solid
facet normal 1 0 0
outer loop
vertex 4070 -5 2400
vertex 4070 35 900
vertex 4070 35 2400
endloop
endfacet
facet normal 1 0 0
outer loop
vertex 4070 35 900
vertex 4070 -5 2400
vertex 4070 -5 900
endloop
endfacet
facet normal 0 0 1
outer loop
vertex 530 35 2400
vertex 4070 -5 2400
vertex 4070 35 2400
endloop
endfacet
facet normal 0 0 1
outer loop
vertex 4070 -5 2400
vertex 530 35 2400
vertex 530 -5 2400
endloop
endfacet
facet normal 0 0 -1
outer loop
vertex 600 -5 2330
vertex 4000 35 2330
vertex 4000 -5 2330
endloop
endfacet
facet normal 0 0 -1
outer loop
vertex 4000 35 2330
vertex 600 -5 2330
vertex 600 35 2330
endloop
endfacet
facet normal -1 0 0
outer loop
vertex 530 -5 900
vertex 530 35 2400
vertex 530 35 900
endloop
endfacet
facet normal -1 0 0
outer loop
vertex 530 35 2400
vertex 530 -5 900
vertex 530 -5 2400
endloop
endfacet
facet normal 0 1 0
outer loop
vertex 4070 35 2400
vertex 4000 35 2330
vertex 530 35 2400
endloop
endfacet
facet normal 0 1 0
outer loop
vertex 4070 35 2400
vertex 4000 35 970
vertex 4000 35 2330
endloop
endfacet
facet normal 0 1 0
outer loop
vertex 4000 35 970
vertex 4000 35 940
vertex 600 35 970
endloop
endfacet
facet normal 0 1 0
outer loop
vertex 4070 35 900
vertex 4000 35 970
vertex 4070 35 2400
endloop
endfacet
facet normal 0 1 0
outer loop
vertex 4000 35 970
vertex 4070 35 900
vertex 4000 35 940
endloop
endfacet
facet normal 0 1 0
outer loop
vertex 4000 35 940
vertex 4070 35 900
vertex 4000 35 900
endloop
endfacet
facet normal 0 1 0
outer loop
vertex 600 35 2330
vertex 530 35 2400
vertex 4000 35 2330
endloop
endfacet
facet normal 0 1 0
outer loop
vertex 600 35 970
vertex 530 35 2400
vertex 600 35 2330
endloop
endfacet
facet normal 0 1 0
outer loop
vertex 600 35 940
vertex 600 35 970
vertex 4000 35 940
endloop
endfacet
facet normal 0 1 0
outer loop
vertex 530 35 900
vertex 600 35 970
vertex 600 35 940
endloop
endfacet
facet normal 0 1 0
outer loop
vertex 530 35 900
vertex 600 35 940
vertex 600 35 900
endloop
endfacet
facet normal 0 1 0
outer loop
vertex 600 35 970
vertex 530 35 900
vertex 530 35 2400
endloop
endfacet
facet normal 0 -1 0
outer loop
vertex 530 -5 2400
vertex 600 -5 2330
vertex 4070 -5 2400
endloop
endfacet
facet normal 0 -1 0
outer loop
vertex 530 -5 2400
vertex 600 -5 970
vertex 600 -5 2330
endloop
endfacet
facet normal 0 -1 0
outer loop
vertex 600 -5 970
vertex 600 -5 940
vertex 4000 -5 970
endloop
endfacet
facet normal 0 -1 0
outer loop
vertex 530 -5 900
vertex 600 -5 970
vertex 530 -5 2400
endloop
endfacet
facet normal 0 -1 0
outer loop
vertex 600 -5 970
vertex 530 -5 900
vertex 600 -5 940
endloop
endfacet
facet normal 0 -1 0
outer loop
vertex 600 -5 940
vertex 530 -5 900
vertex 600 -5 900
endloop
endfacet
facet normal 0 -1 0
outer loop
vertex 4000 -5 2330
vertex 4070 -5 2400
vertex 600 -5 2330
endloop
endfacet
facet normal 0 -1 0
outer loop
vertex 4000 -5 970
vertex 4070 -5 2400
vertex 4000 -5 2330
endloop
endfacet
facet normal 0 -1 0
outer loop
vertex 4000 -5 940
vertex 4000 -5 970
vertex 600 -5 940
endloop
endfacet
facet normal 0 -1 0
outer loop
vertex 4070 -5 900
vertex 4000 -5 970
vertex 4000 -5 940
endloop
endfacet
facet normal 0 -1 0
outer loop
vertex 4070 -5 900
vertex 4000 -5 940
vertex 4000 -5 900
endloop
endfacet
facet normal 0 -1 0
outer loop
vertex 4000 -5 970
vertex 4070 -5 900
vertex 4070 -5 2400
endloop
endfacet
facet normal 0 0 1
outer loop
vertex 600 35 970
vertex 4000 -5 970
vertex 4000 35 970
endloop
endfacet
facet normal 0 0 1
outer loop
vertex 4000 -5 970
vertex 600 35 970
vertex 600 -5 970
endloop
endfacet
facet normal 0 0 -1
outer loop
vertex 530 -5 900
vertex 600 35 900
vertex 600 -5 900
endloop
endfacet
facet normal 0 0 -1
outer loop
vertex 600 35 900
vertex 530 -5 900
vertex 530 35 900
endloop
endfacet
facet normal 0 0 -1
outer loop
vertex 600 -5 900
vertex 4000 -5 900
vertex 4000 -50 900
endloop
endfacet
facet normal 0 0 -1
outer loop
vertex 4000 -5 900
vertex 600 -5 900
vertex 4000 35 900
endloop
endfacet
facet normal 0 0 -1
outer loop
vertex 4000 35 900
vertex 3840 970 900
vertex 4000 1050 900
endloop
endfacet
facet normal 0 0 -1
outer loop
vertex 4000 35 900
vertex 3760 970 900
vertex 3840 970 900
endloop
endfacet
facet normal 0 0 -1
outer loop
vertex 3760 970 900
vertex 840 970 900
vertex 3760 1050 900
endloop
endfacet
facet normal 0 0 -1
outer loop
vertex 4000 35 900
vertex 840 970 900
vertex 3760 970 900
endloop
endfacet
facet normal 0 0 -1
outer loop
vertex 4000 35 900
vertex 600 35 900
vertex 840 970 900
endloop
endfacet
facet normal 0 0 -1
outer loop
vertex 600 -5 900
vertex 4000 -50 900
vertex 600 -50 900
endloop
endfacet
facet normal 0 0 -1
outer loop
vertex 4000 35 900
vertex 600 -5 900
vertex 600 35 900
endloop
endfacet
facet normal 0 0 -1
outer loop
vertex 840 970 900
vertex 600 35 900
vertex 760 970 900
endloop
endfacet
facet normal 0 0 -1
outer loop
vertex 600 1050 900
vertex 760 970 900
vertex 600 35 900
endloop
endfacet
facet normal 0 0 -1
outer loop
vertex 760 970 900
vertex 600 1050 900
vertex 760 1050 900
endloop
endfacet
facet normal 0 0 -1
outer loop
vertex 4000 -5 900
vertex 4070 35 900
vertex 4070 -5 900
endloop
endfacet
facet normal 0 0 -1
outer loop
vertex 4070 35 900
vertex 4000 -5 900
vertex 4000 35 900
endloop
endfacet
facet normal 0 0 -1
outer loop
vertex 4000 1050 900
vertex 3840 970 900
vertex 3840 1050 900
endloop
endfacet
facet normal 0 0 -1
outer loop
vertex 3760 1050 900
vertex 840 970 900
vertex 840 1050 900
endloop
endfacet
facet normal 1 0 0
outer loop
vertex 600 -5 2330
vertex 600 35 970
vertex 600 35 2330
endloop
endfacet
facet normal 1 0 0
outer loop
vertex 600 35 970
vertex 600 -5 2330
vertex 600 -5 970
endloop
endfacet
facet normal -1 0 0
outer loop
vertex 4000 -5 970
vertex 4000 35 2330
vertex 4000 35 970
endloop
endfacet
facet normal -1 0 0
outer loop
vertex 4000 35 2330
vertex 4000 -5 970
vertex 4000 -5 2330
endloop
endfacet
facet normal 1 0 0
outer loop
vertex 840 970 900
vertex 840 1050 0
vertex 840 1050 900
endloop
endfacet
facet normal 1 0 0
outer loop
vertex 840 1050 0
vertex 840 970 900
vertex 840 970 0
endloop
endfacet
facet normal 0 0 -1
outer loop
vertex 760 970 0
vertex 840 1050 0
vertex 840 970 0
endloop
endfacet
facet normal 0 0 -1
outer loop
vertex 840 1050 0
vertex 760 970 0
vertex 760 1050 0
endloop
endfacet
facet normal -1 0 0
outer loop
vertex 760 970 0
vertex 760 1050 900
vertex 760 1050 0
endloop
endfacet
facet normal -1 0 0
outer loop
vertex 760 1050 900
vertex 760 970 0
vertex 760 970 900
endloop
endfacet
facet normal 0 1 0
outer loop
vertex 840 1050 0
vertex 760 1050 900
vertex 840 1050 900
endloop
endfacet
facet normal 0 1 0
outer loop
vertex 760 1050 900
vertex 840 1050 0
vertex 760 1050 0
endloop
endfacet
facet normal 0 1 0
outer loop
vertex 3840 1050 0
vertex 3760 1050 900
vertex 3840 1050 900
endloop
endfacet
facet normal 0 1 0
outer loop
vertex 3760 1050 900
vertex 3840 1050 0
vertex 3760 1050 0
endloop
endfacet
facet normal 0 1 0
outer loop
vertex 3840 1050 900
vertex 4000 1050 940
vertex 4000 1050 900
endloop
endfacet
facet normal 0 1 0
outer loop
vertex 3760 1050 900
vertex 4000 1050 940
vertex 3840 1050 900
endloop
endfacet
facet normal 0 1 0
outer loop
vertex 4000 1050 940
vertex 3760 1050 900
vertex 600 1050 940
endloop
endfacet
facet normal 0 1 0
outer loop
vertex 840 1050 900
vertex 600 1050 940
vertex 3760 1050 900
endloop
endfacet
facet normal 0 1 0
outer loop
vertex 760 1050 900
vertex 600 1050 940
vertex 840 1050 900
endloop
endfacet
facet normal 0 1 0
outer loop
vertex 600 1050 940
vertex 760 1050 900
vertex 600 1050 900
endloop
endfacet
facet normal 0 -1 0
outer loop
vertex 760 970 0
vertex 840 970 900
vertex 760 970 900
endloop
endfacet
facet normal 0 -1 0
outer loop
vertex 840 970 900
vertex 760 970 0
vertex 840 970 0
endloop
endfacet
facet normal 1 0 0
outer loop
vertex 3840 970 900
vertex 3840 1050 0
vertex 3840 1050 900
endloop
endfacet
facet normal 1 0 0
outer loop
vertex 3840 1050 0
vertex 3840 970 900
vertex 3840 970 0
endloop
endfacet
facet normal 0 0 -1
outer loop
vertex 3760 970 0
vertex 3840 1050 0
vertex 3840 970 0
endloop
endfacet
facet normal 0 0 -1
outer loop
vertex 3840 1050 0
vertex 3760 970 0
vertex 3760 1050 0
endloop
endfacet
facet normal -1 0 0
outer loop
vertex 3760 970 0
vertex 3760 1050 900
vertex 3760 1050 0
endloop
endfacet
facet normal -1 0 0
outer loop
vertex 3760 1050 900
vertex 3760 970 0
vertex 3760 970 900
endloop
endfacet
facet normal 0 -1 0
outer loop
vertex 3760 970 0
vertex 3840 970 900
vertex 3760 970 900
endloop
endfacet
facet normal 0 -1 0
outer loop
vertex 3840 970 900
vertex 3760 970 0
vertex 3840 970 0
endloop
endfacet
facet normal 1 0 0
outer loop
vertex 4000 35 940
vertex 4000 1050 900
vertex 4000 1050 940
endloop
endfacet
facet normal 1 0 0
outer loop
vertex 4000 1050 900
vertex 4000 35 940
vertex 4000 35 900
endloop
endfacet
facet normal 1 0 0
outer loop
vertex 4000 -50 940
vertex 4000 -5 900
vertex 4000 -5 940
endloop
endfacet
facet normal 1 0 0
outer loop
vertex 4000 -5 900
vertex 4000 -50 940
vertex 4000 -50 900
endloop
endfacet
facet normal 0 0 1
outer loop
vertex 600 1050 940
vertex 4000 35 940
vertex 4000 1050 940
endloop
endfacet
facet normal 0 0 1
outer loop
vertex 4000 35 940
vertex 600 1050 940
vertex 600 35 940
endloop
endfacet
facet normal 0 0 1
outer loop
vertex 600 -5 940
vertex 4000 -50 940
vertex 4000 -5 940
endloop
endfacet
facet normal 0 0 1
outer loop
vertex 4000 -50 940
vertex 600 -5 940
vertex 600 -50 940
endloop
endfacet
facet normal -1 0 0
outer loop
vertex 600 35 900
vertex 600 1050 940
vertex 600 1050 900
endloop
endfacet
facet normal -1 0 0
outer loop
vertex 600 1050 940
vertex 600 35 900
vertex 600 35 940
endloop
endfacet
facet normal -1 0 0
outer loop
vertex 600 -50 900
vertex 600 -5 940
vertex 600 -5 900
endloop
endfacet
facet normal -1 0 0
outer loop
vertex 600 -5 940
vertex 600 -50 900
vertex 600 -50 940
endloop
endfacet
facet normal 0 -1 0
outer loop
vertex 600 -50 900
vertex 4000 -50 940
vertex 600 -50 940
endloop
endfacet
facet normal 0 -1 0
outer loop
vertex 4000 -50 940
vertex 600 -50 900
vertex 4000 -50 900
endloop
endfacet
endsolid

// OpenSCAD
// =============================================================================
// Tea Shop — GROUP 4: COUNTER / SERVICE WINDOW
// =============================================================================
// All units: mm (1000 mm = 1.0 m), real-life scale.
// GTA V uses metres: 1000 OpenSCAD units = 1 GTA unit.
//
// SHARED GLOBAL COORDINATE SYSTEM (identical to Groups 1–3):
//   +X -> left -> right  (0 = left outer wall face, BUILD_W = right outer wall)
//   +Y -> front -> back  (0 = front eave wall face, BUILD_D = back wall)
//   +Z -> up             (0 = ground / plinth top datum)
//
// This group fills the window opening left empty in Group 1's front wall.
// The window opening in Group 1 spans:
//   X: [window_left .. window_right] = [600 .. 4000]  (width = 3400 mm)
//   Z: [sill_height .. front_eave_height] = [900 .. 2400]  (height = 1500 mm)
//   Y: the wall occupies [0 .. wall_thickness] = [0 .. 250]
//
// REFERENCE ANALYSIS (from attached PDF / reference images):
//
// 1. WINDOW FRAME — Front elevation (9b1fed6bc4, d9d4619809) clearly shows
//    a teal/blue-painted frame surrounding the service window opening. The
//    frame consists of 4 bars:
//      - Top header bar across the top of the opening
//      - Bottom sill trim bar across the bottom (sitting on top of the sill wall)
//      - Left vertical jamb bar
//      - Right vertical jamb bar
//    MULLIONS: The front elevation and wireframe images both show a single
//    uninterrupted clear span with NO vertical mullion dividers. The opening
//    is one large service hatch. Mullion module is therefore OMITTED.
//
// 2. COUNTER LEDGE — The wireframe interior shot (8ffafd36e4) and clay render
//    (4b97af2b49) show a flat counter slab sitting ON TOP of the sill wall,
//    extending ~800 mm inward (toward the back wall) into the interior. Tea
//    items (stove, teapot, glasses) rest on this surface. The ledge appears
//    to be a separate raised slab sitting on top of the front_wall_sill from
//    Group 1, NOT flush with the sill's top face — it has visible thickness.
//    The ledge also overhangs slightly forward (~50 mm) past the outer wall
//    face for the exterior "counter" service lip where customers are served.
//
// 3. COUNTER SUPPORT LEGS — The wireframe interior shot (8ffafd36e4) shows
//    two small rectangular support legs/blocks under the counter ledge on the
//    interior side, near the left and right ends of the counter span, where
//    the ledge cantilevers past the sill wall into the room.
//
// UV UNWRAPPING PRIORITY (for Blender/GTA V MLO workflow):
//   HIGH PRIORITY (visible, textured):
//     - Frame bars: the front-facing painted surfaces (exterior face toward -Y)
//     - Counter ledge: the top surface (items sit here, visible through window)
//     - Counter ledge: the front edge (visible to customers outside)
//   LOW PRIORITY (hidden/interior, can use simple flat color):
//     - Frame bars: back faces (hidden against wall)
//     - Counter ledge: bottom face (hidden, under the slab)
//     - Support legs: mostly hidden under the counter
//
// TODO: The counter-top tea service props (stove, kettle, glasses, jars,
//       bread packets — a later group) sit on top of counter_ledge().
// TODO: The "TEA PRICE LIST" sign (a later group) mounts on the exterior
//       wall face just below/beside this window, at approximately
//       X = 600..1200, Z = 400..850 (visible in reference 9b1fed6bc4).
// TODO: The small framed picture/poster visible on the interior back wall
//       above the counter (visible in wireframe 8ffafd36e4) is a later group.
// =============================================================================


// =============================================================================
// 1. SHARED GLOBAL VARIABLES (from Groups 1–3 — identical values, not changed)
// =============================================================================
WALL_T  = 250;   // wall panel thickness                      (0.25 m)
BUILD_W = 6000;  // building width along X                    (6.00 m)
BUILD_D = 4000;  // building depth along Y                    (4.00 m)
BACK_H  = 3200;  // wall height at BACK (tall lean-to side)   (3.20 m)
FRONT_H = 2400;  // wall height at FRONT eave (short side)    (2.40 m)

wall_thickness    = WALL_T;
building_width    = BUILD_W;
building_depth    = BUILD_D;
back_height       = BACK_H;
front_eave_height = FRONT_H;

// Group 1 front wall opening dimensions:
left_pier_width   = 600;
window_width      = 3400;
mid_pier_width    = 500;
door_width        = 1000;
sill_height       = 900;

// Derived from Group 1 (identical to tea_shop_parameters.scad):
window_left       = left_pier_width;                    // 600 mm
window_right      = window_left + window_width;         // 4000 mm
door_left         = window_right + mid_pier_width;      // 4500 mm
door_right        = door_left + door_width;             // 5500 mm
window_open_height = front_eave_height - sill_height;   // 1500 mm


// =============================================================================
// 2. GROUP 4 PARAMETERS — Window Frame & Counter Dimensions
// =============================================================================

// --- Window Frame Bars -------------------------------------------------------
// REFERENCE NOTE: The teal/blue frame in the front elevation (9b1fed6bc4)
// appears to be roughly 60-80 mm wide painted timber/steel bar, with a
// depth (thickness into the wall) of about 40-50 mm. The frame sits on
// the EXTERIOR face of the wall (Y < wall_thickness), flush with or
// slightly proud of the wall surface.
//
// [ESTIMATE NOTE]: Bar width and depth estimated from proportional analysis
// of the front elevation — the frame bars are roughly 1/20th of the window
// opening height (1500/20 ≈ 75 mm) and appear as a thin painted strip.
FRAME_BAR_WIDTH   = 70;    // visible width of the frame bar (mm)         (0.07 m)
FRAME_BAR_DEPTH   = 40;    // thickness of frame bar into the wall (mm)   (0.04 m)

// Frame placement: the frame sits on the exterior wall face. The wall outer
// face is at Y = 0. The frame bar centre-line aligns with the wall face,
// so the frame protrudes slightly forward of the wall (by half its depth)
// and slightly inward. This creates the visible painted border seen in the
// reference without z-fighting against the wall geometry.
FRAME_Y_OFFSET    = -5;    // frame starts 5 mm forward of wall face (avoids z-fight)

// Frame fit logic:
// The header and sill trim bars span the FULL window opening width (WIN_W)
// plus overlap onto the pier edges by FRAME_BAR_WIDTH on each side, so
// the frame visually "wraps" the opening. The jambs run vertically between
// the header and sill trim, sitting inside the horizontal bars.
// This means:
//   Header/Sill X span:  [window_left - FRAME_BAR_WIDTH .. window_right + FRAME_BAR_WIDTH]
//   Header/Sill total W: window_width + 2 * FRAME_BAR_WIDTH
//   Jamb X:              left jamb at [window_left - FRAME_BAR_WIDTH .. window_left]
//                        right jamb at [window_right .. window_right + FRAME_BAR_WIDTH]
//   Jamb Z span:         [sill_height .. sill_height + window_open_height]
//                        (between the sill trim top and header bottom)

// --- Counter Ledge -----------------------------------------------------------
// REFERENCE NOTE: The wireframe interior (8ffafd36e4) shows the counter slab
// extending approximately 800 mm back from the front wall into the interior.
// The clay render (4b97af2b49) confirms a flat work surface at sill height
// with tea-making items arranged on it.
//
// [ESTIMATE NOTE]: Counter depth estimated from interior wireframe proportions.
// The ledge appears to span roughly 20-25% of the building depth (4000 mm),
// so ~800-1000 mm. Using 800 mm as a conservative estimate.
COUNTER_DEPTH     = 800;   // how far the counter extends inward (Y dir)  (0.80 m)
COUNTER_THICKNESS = 40;    // slab thickness of the counter top           (0.04 m)
COUNTER_OVERHANG  = 50;    // how far the counter lip overhangs forward   (0.05 m)
                           // past the outer wall face (customers lean here)

// The counter ledge spans the same X range as the window opening:
COUNTER_X_START   = window_left;   // 600 mm (same as window start)
COUNTER_X_END     = window_right;  // 4000 mm (same as window end)
COUNTER_WIDTH     = COUNTER_X_END - COUNTER_X_START;  // 3400 mm

// Counter Z position: the ledge sits ON TOP of the front_wall_sill
// (which occupies Z = [0 .. sill_height]). The ledge's bottom face
// sits at Z = sill_height (flush on the sill top), and the counter
// top surface is at Z = sill_height + COUNTER_THICKNESS.
COUNTER_Z         = sill_height;   // 900 mm

// --- Counter Support Legs ----------------------------------------------------
// REFERENCE NOTE: The wireframe interior shot (8ffafd36e4) shows two small
// rectangular blocks/legs supporting the cantilevered portion of the counter
// ledge on the interior side. They appear near the left and right ends of
// the counter, standing on the floor (Z=0) up to the underside of the ledge.
//
// [ESTIMATE NOTE]: Leg cross-section estimated at ~80x80 mm (small timber
// posts), and they appear to be inset ~200 mm from each end of the counter.
LEG_WIDTH         = 80;    // leg cross-section along X                   (0.08 m)
LEG_DEPTH         = 80;    // leg cross-section along Y                   (0.08 m)
LEG_HEIGHT        = sill_height;  // legs run from floor to sill height   (0.90 m)

// Leg positions (X coordinate of leg centre):
// Inset ~200 mm from each end of the counter span
LEG_INSET         = 200;   // how far each leg is inset from counter edge (mm)
LEG_LEFT_X        = COUNTER_X_START + LEG_INSET;   // 600 + 200 = 800 mm
LEG_RIGHT_X       = COUNTER_X_END - LEG_INSET;     // 4000 - 200 = 3800 mm

// Leg Y position: the legs sit at the BACK edge of the counter ledge,
// supporting the cantilevered portion farthest from the front wall.
// Back edge of counter = wall_thickness + COUNTER_DEPTH
LEG_Y             = wall_thickness + COUNTER_DEPTH - LEG_DEPTH;  // interior side


// =============================================================================
// MODULE 1a: window_header()
// -----------------------------------------------------------------------------
// Top horizontal bar of the window frame. Sits across the top edge of the
// window opening at Z = sill_height + window_open_height = front_eave_height.
// Spans the full opening width plus overlap onto both piers.
//
// Position derivation:
//   X: window_left - FRAME_BAR_WIDTH  (overlaps onto left pier by one bar width)
//   Y: FRAME_Y_OFFSET (slightly forward of wall face to avoid z-fighting)
//   Z: front_eave_height - FRAME_BAR_WIDTH  (bar hangs down from eave line)
//       to front_eave_height (top flush with eave line)
// =============================================================================
module window_header() {
    translate([
        window_left - FRAME_BAR_WIDTH,            // X: start overlapping left pier
        FRAME_Y_OFFSET,                            // Y: slightly proud of wall face
        front_eave_height - FRAME_BAR_WIDTH        // Z: hangs down from eave line
    ])
        cube([
            window_width + 2 * FRAME_BAR_WIDTH,   // X span: full opening + overlap
            FRAME_BAR_DEPTH,                        // Y: bar thickness into wall
            FRAME_BAR_WIDTH                         // Z: bar height
        ]);
}


// =============================================================================
// MODULE 1b: window_sill_trim()
// -----------------------------------------------------------------------------
// Bottom horizontal bar of the window frame. Sits across the bottom edge of
// the window opening at Z = sill_height.
// Spans the full opening width plus overlap onto both piers.
//
// Position derivation:
//   X: same as header
//   Y: FRAME_Y_OFFSET
//   Z: sill_height  (sits on top of the sill wall's top face)
// =============================================================================
module window_sill_trim() {
    translate([
        window_left - FRAME_BAR_WIDTH,
        FRAME_Y_OFFSET,
        sill_height
    ])
        cube([
            window_width + 2 * FRAME_BAR_WIDTH,
            FRAME_BAR_DEPTH,
            FRAME_BAR_WIDTH
        ]);
}


// =============================================================================
// MODULE 1c: window_jamb_left()
// -----------------------------------------------------------------------------
// Left vertical bar of the window frame. Runs along the left edge of the
// window opening (at X = window_left).
//
// Position derivation:
//   X: window_left - FRAME_BAR_WIDTH  (sits on the pier side of the opening edge)
//   Y: FRAME_Y_OFFSET
//   Z: sill_height  (starts at sill top, runs up to eave)
//   Height: window_open_height (fills the full opening vertically)
// =============================================================================
module window_jamb_left() {
    translate([
        window_left - FRAME_BAR_WIDTH,
        FRAME_Y_OFFSET,
        sill_height
    ])
        cube([
            FRAME_BAR_WIDTH,
            FRAME_BAR_DEPTH,
            window_open_height
        ]);
}


// =============================================================================
// MODULE 1d: window_jamb_right()
// -----------------------------------------------------------------------------
// Right vertical bar of the window frame. Runs along the right edge of the
// window opening (at X = window_right).
//
// Position derivation:
//   X: window_right  (flush with the right side of the opening)
//   Y: FRAME_Y_OFFSET
//   Z: sill_height
//   Height: window_open_height
// =============================================================================
module window_jamb_right() {
    translate([
        window_right,
        FRAME_Y_OFFSET,
        sill_height
    ])
        cube([
            FRAME_BAR_WIDTH,
            FRAME_BAR_DEPTH,
            window_open_height
        ]);
}


// =============================================================================
// MODULE 1: window_frame()
// -----------------------------------------------------------------------------
// Combines all 4 frame sub-pieces into one composite module for convenience.
// Each sub-piece remains independently callable for separate OBJ export.
//
// MULLION NOTE: The reference front elevation (9b1fed6bc4) and wireframe
// (9cc7378ff7) both show the service window as a SINGLE uninterrupted
// opening — there are NO vertical mullion bars dividing the span into
// panes. The window_mullion() module is therefore intentionally omitted.
// If a mullion is later needed (e.g. for a variant), add a vertical bar
// at the midpoint: translate([window_left + window_width/2 - FRAME_BAR_WIDTH/2, ...]).
// =============================================================================
module window_frame() {
    window_header();
    window_sill_trim();
    window_jamb_left();
    window_jamb_right();
}


// =============================================================================
// MODULE 2: counter_ledge()
// -----------------------------------------------------------------------------
// The flat interior counter slab/table that sits at sill height, extending
// inward (toward the back wall) into the building interior. This is the
// work surface where tea items (stove, teapot, glasses, jars) rest.
//
// REFERENCE CHECK: The counter is a SEPARATE raised slab sitting ON TOP of
// the front_wall_sill from Group 1. In the wireframe (8ffafd36e4) you can
// see a clear horizontal line at counter level that is distinct from and
// slightly above the sill wall top face. The counter also overhangs slightly
// forward past the outer wall face, creating a service lip for customers.
//
// Position derivation:
//   X: window_left (600 mm) to window_right (4000 mm) — same as window span
//   Y: -COUNTER_OVERHANG (extends 50 mm forward of wall outer face)
//      to wall_thickness + COUNTER_DEPTH (extends 800 mm past inner wall face)
//   Z: sill_height (900 mm) — bottom face sits on top of the sill wall
//   Thickness: COUNTER_THICKNESS (40 mm) — top surface at Z = 940 mm
//
// TODO: Counter-top tea service props (stove, kettle, glasses, jars,
//       bread packets) sit on top of this surface (Z = sill_height +
//       COUNTER_THICKNESS = 940 mm). These are a later component group.
// =============================================================================
module counter_ledge() {
    translate([
        COUNTER_X_START,                           // X: left edge of window
        -COUNTER_OVERHANG,                         // Y: overhangs forward past wall
        COUNTER_Z                                   // Z: sits on sill top
    ])
        cube([
            COUNTER_WIDTH,                          // X: 3400 mm
            COUNTER_OVERHANG + wall_thickness + COUNTER_DEPTH,  // Y: total depth
            COUNTER_THICKNESS                       // Z: 40 mm thick
        ]);
}


// =============================================================================
// MODULE 3: counter_support_leg()
// -----------------------------------------------------------------------------
// A single rectangular support leg/block that stands under the counter ledge
// on the interior side, supporting the cantilevered portion of the counter
// that extends past the front wall into the room.
//
// Modeled at the specified [x, y] position, standing from Z=0 to Z=sill_height.
// Instanced twice in assemble(): once at LEG_LEFT_X, once at LEG_RIGHT_X.
//
// REFERENCE CHECK: The wireframe interior shot (8ffafd36e4) clearly shows
// rectangular blocks under the counter near the left and right ends. They
// appear to be simple timber posts (~80x80 mm cross-section).
//
// [ESTIMATE NOTE]: Leg positions (200 mm inset from each end of the counter
// span) are estimated — the wireframe doesn't give exact pixel positions,
// but the legs are clearly near the extremes of the counter, not centred.
// =============================================================================
module counter_support_leg(x_pos) {
    translate([
        x_pos - LEG_WIDTH / 2,                    // X: centred on x_pos
        LEG_Y,                                     // Y: at back edge of counter
        0                                           // Z: floor
    ])
        cube([
            LEG_WIDTH,                              // X: 80 mm
            LEG_DEPTH,                              // Y: 80 mm
            LEG_HEIGHT                              // Z: floor to sill (900 mm)
        ]);
}


// =============================================================================
// assemble() — Visual verification preview for Group 4 only (not for export).
// Shows all counter/window pieces together in distinct colors.
// Frame bars are teal/blue to match the reference paint color.
// =============================================================================
module assemble() {
    // --- Window frame (teal/blue as in reference paint) ----------------------
    color("Teal") {
        window_header();
        window_sill_trim();
        window_jamb_left();
        window_jamb_right();
    }

    // --- Counter ledge (wood tone — visible work surface) --------------------
    color("Peru")
        counter_ledge();

    // --- Counter support legs (2 instances, darker wood) ---------------------
    color("SaddleBrown") {
        counter_support_leg(LEG_LEFT_X);
        counter_support_leg(LEG_RIGHT_X);
    }
}

// Default preview invocation:
assemble();
